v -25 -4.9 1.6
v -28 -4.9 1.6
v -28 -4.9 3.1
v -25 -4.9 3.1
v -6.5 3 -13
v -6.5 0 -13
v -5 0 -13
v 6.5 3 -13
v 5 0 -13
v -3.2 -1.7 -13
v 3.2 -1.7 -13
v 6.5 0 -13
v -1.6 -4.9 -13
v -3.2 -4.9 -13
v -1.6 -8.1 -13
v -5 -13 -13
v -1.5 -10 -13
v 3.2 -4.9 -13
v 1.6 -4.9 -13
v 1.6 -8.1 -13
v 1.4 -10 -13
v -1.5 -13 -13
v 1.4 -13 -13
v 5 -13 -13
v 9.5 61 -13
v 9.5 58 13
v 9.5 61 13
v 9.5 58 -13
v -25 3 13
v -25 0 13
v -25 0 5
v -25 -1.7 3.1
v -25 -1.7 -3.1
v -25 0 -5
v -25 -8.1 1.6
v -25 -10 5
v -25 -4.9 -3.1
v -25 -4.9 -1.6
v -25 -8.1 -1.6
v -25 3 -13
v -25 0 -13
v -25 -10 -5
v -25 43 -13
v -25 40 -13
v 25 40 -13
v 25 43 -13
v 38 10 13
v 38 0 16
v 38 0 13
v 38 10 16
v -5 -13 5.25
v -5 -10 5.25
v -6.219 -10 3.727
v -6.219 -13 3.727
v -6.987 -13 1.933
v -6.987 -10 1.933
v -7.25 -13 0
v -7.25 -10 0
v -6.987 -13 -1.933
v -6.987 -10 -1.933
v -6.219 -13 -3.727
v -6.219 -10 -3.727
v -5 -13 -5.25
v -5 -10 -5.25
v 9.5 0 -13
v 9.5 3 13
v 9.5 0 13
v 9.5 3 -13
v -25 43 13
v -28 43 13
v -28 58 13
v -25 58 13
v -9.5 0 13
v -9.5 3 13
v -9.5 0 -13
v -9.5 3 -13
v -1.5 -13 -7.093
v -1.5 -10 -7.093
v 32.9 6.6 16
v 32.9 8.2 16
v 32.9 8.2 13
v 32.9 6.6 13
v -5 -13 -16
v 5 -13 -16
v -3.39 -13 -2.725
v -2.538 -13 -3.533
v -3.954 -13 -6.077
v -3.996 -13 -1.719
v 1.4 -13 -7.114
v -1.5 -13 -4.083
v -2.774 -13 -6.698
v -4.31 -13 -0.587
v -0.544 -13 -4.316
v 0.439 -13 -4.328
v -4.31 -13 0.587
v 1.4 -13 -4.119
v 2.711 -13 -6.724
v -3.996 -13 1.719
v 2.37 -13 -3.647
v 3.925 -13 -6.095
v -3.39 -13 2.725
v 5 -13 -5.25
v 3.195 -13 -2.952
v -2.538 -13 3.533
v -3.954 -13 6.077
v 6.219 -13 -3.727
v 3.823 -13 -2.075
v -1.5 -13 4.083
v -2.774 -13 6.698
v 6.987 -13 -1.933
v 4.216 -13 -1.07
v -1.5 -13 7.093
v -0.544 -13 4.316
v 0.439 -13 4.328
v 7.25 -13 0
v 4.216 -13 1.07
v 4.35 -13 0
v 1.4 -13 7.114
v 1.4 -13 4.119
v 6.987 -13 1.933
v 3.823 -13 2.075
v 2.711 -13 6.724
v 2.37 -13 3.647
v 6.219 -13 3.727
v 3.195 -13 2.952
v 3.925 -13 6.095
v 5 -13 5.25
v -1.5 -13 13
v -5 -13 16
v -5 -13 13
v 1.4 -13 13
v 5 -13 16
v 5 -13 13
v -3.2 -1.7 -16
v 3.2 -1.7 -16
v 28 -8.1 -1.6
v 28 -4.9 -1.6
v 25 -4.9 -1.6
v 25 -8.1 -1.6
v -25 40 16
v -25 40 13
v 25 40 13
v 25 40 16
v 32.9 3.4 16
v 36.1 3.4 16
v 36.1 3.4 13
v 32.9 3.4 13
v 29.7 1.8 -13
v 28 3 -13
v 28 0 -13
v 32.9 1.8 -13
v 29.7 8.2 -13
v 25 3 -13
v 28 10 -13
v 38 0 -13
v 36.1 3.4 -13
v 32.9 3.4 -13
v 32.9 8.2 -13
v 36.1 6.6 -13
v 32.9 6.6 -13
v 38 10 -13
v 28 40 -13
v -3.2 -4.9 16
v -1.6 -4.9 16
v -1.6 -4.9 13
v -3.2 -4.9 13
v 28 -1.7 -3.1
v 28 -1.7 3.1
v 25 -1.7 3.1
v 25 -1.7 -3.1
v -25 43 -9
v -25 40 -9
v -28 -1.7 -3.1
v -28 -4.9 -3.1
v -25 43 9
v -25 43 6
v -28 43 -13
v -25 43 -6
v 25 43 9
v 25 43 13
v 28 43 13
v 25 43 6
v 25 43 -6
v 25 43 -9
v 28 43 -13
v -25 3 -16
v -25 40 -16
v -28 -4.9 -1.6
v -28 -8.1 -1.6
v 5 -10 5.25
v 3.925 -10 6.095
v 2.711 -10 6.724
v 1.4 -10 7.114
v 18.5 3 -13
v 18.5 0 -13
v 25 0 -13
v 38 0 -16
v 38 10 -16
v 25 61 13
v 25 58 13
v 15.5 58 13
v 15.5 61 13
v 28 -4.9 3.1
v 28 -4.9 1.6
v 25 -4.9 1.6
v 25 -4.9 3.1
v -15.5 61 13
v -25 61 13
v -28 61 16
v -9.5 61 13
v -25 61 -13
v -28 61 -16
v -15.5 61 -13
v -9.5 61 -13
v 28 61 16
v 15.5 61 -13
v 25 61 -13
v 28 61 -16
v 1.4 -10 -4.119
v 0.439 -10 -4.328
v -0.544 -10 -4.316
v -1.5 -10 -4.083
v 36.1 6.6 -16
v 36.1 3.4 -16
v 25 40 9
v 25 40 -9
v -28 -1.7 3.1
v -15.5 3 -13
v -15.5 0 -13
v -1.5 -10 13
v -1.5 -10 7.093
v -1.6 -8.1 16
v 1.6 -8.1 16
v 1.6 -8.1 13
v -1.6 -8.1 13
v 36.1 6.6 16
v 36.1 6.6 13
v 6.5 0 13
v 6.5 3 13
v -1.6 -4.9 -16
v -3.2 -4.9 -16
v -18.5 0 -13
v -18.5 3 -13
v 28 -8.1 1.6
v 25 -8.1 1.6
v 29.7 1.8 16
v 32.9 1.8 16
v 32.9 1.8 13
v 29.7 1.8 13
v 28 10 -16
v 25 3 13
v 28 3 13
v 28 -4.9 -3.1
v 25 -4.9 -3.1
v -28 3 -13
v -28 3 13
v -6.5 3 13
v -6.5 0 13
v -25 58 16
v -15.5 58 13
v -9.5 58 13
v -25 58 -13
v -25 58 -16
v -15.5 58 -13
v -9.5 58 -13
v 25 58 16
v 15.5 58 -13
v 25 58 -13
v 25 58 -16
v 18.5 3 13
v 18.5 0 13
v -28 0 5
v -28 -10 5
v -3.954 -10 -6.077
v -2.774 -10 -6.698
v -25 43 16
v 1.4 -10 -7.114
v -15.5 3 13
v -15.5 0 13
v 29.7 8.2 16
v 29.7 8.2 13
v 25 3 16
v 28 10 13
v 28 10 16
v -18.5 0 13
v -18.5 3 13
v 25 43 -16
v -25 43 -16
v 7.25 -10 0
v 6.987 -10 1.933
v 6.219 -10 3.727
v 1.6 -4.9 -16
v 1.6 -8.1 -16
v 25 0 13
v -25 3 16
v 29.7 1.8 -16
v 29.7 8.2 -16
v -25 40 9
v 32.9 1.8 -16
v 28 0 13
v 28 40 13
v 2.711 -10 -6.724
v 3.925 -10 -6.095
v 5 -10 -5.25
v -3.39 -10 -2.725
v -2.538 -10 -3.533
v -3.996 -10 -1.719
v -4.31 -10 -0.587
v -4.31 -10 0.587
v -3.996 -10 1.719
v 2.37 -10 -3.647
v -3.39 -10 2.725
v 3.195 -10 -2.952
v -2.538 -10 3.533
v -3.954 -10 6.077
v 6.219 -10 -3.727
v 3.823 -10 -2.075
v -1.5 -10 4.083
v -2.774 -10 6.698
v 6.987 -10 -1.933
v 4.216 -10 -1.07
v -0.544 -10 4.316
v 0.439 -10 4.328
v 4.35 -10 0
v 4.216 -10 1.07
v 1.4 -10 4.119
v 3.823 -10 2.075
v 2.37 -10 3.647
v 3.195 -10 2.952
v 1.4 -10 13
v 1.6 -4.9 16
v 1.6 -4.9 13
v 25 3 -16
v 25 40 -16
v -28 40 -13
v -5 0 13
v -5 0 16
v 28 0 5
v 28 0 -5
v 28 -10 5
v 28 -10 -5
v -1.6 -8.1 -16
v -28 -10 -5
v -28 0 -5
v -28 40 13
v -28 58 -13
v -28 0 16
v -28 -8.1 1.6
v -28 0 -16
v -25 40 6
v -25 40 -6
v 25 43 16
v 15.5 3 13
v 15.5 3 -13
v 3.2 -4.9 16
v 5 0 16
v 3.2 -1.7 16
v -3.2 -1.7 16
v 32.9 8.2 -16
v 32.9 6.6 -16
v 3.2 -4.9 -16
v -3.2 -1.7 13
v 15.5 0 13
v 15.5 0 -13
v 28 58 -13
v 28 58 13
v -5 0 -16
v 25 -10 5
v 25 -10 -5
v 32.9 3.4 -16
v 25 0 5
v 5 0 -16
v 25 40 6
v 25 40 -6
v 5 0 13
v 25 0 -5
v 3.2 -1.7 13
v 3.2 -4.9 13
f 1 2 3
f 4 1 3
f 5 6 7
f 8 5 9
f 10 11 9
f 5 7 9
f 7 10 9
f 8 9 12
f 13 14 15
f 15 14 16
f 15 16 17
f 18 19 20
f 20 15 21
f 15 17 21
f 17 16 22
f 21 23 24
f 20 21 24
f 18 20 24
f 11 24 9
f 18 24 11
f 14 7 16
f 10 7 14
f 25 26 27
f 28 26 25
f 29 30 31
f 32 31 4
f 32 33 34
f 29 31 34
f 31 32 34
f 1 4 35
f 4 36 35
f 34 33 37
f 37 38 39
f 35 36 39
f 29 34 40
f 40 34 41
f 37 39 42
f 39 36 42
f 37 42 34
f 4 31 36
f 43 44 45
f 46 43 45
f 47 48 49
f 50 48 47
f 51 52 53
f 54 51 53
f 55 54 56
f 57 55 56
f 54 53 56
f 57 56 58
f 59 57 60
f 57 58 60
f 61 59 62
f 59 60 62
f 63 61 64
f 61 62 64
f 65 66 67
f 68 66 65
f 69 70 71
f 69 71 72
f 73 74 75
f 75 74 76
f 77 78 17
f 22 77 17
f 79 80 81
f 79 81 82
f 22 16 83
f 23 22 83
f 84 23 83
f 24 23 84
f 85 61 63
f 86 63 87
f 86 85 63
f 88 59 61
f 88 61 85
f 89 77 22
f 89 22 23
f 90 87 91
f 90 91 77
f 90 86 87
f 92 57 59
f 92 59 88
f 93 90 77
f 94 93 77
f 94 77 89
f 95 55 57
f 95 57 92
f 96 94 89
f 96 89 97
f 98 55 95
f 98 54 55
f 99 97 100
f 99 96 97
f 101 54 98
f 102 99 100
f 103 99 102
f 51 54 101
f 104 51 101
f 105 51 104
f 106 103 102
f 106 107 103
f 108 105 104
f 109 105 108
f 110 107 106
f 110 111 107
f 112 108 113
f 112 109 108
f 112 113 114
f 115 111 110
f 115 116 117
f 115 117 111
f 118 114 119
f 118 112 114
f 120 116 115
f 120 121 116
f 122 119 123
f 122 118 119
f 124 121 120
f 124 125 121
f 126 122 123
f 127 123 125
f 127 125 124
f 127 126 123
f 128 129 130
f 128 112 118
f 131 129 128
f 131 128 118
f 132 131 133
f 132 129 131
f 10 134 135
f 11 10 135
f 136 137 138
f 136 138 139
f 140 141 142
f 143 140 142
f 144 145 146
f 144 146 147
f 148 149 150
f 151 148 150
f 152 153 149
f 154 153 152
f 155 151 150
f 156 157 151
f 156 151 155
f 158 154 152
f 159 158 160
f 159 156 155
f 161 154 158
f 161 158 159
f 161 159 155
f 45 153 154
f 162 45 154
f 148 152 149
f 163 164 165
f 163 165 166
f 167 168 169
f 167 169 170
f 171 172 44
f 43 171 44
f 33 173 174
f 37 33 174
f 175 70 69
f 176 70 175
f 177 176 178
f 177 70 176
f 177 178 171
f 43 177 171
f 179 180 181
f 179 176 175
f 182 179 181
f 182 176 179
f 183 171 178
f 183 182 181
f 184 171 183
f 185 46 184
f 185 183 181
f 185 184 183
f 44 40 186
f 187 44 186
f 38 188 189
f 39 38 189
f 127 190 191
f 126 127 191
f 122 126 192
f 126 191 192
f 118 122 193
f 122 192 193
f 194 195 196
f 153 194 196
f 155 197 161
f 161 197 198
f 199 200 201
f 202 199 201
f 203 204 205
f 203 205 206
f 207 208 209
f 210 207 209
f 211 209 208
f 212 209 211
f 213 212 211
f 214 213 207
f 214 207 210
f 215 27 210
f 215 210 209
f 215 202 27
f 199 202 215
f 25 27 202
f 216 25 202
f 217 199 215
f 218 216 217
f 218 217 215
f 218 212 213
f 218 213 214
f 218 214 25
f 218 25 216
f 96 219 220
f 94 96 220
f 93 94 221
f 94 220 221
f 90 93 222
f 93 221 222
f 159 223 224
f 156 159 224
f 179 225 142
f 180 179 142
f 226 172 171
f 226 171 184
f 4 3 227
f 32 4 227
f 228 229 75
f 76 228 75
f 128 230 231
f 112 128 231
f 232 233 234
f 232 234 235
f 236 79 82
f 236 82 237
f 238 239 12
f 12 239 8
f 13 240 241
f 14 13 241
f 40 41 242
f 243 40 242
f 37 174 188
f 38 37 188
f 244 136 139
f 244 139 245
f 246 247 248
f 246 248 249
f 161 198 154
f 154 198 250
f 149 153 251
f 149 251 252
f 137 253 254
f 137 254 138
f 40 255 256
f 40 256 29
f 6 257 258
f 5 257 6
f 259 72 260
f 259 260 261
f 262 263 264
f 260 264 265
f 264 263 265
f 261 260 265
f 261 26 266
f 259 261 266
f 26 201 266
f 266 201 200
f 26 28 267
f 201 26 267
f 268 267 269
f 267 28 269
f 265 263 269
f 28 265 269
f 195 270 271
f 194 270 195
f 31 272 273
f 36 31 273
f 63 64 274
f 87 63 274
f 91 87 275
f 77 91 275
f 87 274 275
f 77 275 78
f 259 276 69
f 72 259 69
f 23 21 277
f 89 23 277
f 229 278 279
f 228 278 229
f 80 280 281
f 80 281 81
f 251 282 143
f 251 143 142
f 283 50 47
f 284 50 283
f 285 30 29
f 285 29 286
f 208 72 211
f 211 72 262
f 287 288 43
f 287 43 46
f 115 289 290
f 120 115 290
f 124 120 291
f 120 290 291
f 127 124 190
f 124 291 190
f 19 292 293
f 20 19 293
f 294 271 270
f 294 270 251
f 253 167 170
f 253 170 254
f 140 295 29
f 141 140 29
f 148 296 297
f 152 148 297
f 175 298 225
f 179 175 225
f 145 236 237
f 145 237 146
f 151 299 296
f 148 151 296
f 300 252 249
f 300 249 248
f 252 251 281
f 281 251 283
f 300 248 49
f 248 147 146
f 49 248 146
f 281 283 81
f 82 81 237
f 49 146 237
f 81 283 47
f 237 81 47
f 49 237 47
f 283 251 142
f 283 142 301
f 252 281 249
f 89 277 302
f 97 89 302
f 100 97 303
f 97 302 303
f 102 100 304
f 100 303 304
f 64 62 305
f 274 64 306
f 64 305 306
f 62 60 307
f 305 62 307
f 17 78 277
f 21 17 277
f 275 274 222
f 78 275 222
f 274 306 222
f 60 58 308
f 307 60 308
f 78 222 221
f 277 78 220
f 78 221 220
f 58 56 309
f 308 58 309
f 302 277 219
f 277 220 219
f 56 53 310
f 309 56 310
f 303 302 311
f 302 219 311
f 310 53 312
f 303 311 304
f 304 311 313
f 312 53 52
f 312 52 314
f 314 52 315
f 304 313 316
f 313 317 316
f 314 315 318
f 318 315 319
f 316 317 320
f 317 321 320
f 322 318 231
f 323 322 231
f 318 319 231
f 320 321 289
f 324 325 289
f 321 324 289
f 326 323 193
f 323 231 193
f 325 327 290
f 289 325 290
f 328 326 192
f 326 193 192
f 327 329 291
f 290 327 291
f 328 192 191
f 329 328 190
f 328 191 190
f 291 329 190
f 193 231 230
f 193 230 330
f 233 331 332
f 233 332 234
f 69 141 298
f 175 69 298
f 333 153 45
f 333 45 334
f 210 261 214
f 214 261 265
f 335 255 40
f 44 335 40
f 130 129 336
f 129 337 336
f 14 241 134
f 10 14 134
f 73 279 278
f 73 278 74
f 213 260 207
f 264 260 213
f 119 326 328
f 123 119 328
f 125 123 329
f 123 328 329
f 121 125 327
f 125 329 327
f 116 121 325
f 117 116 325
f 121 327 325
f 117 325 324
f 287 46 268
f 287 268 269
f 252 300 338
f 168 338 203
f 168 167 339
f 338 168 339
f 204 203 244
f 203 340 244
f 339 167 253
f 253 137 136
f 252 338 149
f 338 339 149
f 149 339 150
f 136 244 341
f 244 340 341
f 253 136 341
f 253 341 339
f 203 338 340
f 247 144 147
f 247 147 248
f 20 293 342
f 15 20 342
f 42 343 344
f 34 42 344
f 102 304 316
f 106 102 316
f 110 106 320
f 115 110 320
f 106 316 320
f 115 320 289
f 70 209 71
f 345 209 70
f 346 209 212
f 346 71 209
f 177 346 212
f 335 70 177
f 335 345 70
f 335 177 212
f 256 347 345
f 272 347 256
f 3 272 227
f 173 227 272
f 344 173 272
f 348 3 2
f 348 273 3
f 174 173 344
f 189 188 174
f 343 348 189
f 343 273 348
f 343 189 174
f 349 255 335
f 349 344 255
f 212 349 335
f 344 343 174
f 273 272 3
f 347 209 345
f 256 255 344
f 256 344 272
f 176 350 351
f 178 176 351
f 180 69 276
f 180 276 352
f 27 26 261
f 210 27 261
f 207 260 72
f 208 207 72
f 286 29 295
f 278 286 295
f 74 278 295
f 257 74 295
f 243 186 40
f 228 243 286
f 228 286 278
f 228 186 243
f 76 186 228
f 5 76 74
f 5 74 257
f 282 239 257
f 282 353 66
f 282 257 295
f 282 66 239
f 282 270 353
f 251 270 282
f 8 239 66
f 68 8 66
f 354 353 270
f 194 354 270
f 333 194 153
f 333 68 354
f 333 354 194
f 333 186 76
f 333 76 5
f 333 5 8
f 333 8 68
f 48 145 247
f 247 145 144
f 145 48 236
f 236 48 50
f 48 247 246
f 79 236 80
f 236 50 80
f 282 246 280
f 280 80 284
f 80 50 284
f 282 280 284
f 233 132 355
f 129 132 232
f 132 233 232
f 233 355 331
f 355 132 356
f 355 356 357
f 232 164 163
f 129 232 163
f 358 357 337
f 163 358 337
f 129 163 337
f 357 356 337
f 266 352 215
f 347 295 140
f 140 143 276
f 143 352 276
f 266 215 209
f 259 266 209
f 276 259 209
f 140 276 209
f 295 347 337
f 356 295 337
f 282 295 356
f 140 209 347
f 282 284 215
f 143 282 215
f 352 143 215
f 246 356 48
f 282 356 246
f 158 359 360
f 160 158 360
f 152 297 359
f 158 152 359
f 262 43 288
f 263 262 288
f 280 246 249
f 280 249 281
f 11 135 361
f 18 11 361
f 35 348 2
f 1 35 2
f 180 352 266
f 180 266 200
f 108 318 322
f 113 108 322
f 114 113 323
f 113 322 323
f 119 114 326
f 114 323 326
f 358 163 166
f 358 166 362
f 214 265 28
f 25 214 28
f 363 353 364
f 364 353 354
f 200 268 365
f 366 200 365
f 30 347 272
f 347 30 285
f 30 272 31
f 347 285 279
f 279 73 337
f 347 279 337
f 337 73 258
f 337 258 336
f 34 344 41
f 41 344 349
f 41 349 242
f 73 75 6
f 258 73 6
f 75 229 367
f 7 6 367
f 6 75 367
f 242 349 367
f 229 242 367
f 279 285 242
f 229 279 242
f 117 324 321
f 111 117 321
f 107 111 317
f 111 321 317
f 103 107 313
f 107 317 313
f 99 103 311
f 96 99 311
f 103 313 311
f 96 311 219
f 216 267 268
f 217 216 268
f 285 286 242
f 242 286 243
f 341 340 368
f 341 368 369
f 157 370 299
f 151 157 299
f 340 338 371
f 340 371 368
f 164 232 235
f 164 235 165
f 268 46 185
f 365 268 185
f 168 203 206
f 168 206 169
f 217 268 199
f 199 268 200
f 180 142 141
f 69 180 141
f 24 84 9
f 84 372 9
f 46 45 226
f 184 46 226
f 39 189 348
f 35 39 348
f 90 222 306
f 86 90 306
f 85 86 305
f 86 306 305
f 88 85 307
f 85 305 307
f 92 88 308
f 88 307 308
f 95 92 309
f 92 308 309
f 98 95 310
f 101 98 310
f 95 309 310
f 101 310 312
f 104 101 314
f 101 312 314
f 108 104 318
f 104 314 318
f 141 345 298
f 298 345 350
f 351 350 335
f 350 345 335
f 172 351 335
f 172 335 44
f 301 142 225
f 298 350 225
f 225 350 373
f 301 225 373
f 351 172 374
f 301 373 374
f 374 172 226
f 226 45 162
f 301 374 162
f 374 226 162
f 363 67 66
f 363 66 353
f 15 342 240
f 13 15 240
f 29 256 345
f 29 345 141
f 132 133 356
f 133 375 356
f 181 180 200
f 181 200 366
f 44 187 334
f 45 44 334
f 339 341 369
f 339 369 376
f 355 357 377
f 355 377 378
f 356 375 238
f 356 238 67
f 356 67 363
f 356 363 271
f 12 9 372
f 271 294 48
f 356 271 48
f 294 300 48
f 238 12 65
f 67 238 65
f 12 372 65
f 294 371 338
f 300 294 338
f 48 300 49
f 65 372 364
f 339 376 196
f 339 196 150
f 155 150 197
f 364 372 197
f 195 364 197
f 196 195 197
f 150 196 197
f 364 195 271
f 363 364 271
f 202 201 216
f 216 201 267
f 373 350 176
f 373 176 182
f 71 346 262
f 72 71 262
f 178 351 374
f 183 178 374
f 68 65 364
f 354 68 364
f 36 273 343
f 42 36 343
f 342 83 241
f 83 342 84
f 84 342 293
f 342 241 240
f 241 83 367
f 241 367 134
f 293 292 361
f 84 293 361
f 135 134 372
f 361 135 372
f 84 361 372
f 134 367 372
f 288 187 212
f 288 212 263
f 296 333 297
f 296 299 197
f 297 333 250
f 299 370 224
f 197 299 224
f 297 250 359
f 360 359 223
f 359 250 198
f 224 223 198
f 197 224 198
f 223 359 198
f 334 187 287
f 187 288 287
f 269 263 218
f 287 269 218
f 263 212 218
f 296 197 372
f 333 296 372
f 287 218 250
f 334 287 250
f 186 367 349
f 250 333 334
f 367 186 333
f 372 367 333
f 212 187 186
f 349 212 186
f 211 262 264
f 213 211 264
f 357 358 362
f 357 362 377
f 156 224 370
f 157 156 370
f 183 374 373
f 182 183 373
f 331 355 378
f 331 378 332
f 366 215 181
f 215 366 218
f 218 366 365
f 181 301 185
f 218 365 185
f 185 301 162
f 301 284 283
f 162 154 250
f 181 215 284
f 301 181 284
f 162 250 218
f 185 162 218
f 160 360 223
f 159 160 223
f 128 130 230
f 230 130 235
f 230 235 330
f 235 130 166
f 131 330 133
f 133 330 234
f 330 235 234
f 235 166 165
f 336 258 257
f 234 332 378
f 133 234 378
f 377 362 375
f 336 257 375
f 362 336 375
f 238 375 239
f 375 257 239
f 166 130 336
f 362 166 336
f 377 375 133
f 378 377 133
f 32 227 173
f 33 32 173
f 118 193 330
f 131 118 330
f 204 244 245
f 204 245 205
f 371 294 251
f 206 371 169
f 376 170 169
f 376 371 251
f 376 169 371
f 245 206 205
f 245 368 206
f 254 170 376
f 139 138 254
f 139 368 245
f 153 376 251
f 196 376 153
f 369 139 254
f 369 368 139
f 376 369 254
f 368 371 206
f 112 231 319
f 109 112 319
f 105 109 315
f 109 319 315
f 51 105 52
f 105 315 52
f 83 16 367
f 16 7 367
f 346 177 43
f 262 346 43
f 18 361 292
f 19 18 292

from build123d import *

# Parameters (mm, degrees)
SKETCH1_W            = 56
SKETCH1_H            = 32
SKETCH1_W_2          = 50
SKETCH1_H_2          = 26
BOSS_EXTRUDE1_DEPTH  = 3
SKETCH2_W            = 3
SKETCH2_H            = 3
BOSS_EXTRUDE2_DEPTH  = 40
BOSS_EXTRUDE3_DEPTH  = 3
BOSS_EXTRUDE4_DEPTH  = 3
SKETCH5_W            = 3
SKETCH5_H            = 26
BOSS_EXTRUDE5_DEPTH  = 3
SKETCH6_W            = 50
SKETCH6_H            = 3
SKETCH6_W_2          = 3
BOSS_EXTRUDE7_DEPTH  = 3
SKETCH7_W            = 3
SKETCH7_H            = 3
BOSS_EXTRUDE8_DEPTH  = 15
SKETCH8_W            = 3
SKETCH8_H            = 26
SKETCH8_W_2          = 6
SKETCH8_H_2          = 3
BOSS_EXTRUDE9_DEPTH  = 3
BOSS_EXTRUDE10_DEPTH = 3
BOSS_EXTRUDE11_DEPTH = 3


with BuildPart() as part:
    # Sketch1 → Boss-Extrude1 (new body)
    with BuildSketch(Plane(origin=(0, 0, 0), x_dir=(1, 0, 0), z_dir=(0, 1, 0))):
        Rectangle(SKETCH1_W, SKETCH1_H)
        Rectangle(SKETCH1_W_2, SKETCH1_H_2, mode=Mode.SUBTRACT)
    extrude(amount=BOSS_EXTRUDE1_DEPTH)

    # Sketch2 → Boss-Extrude2 (add)
    with BuildSketch(Plane(origin=(0, 0, 0), x_dir=(1, 0, 0), z_dir=(0, 1, 0))):
        with Locations((26.5, 14.5)):
            Rectangle(SKETCH2_W, SKETCH2_H)
        with Locations((26.5, -14.5)):
            Rectangle(SKETCH2_W, SKETCH2_H)
        with Locations((-26.5, -14.5)):
            Rectangle(SKETCH2_W, SKETCH2_H)
        with Locations((-26.5, 14.5)):
            Rectangle(SKETCH2_W, SKETCH2_H)
    extrude(amount=BOSS_EXTRUDE2_DEPTH)

    # Sketch3 → Boss-Extrude3 (add)
    with BuildSketch(Plane.XY.offset(16)):
        Polygon((28, 10), (28, 5), (29.7, 5), (29.7, 8.2), (32.9, 8.2), (32.9, 6.6), (36.1, 6.6), (36.1, 5), (38, 5), (38, 10), align=None)
        Polygon((28, 5), (28, 0), (38, 0), (38, 5), (36.1, 5), (36.1, 3.4), (32.9, 3.4), (32.9, 1.8), (29.7, 1.8), (29.7, 5), align=None)
    boss_extrude3 = extrude(amount=-BOSS_EXTRUDE3_DEPTH)

    # Mirror1: Boss-Extrude3 across plane
    add(boss_extrude3.mirror(Plane.XY))

    # Sketch4 → Boss-Extrude4 (add)
    with BuildSketch(Plane.XY.offset(16)):
        Polygon((5, 0), (0, 0), (-5, 0), (-5, -10), (0, -10), (5, -10), align=None)
        Polygon((1.6, -8.1), (0, -8.1), (-1.6, -8.1), (-1.6, -4.9), (-3.2, -4.9), (-3.2, -1.7), (3.2, -1.7), (3.2, -4.9), (1.6, -4.9), align=None, mode=Mode.SUBTRACT)
    boss_extrude4 = extrude(amount=-BOSS_EXTRUDE4_DEPTH)

    # Mirror2: Boss-Extrude4 across plane
    add(boss_extrude4.mirror(Plane.XY))

    # Sketch5 → Boss-Extrude5 (add)
    with BuildSketch(Plane(origin=(0, 3, 0), x_dir=(1, 0, 0), z_dir=(0, 1, 0))):
        with Locations((-17, 0)):
            Rectangle(SKETCH5_W, SKETCH5_H)
        with Locations((-8, 0)):
            Rectangle(SKETCH5_W, SKETCH5_H)
        with Locations((8, 0)):
            Rectangle(SKETCH5_W, SKETCH5_H)
        with Locations((17, 0)):
            Rectangle(SKETCH5_W, SKETCH5_H)
    extrude(amount=-BOSS_EXTRUDE5_DEPTH)

    # Sketch6 → Boss-Extrude7 (add)
    # profile 1 of 4: a face of its own
    with BuildSketch(Plane(origin=(0, 40, 0), x_dir=(1, 0, 0), z_dir=(0, 1, 0))):
        Polygon((-28, -16), (25, -16), (25, -13), (28, -13), (28, 16), (-28, 16), align=None)
        Polygon((25, -9), (25, -13), (-25, -13), (-25, -9), (-25, -6), (-25, 6), (-25, 9), (-25, 13), (25, 13), (25, 9), (25, 6), (25, -6), align=None, mode=Mode.SUBTRACT)
    # profile 2 of 4: a face of its own
    with BuildSketch(Plane(origin=(0, 40, 0), x_dir=(1, 0, 0), z_dir=(0, 1, 0))):
        with Locations((0, -7.5)):
            Rectangle(SKETCH6_W, SKETCH6_H)
    # profile 3 of 4: a face of its own
    with BuildSketch(Plane(origin=(0, 40, 0), x_dir=(1, 0, 0), z_dir=(0, 1, 0))):
        with Locations((0, 7.5)):
            Rectangle(SKETCH6_W, SKETCH6_H)
    # profile 4 of 4: a face of its own
    with BuildSketch(Plane(origin=(0, 40, 0), x_dir=(1, 0, 0), z_dir=(0, 1, 0))):
        with Locations((26.5, -14.5)):
            Rectangle(SKETCH6_W_2, SKETCH6_H)
    extrude(amount=BOSS_EXTRUDE7_DEPTH)

    # Sketch7 → Boss-Extrude8 (add)
    with BuildSketch(Plane(origin=(0, 43, 0), x_dir=(1, 0, 0), z_dir=(0, 1, 0))):
        with Locations((-26.5, -14.5)):
            Rectangle(SKETCH7_W, SKETCH7_H)
        with Locations((-26.5, 14.5)):
            Rectangle(SKETCH7_W, SKETCH7_H)
        with Locations((26.5, 14.5)):
            Rectangle(SKETCH7_W, SKETCH7_H)
        with Locations((26.5, -14.5)):
            Rectangle(SKETCH7_W, SKETCH7_H)
    extrude(amount=BOSS_EXTRUDE8_DEPTH)

    # Sketch8 → Boss-Extrude9 (add)
    # profile 1 of 5: a face of its own
    with BuildSketch(Plane(origin=(0, 58, 0), x_dir=(1, 0, 0), z_dir=(0, 1, 0))):
        Polygon((-25, 16), (-25, 13), (-28, 13), (-28, -16), (28, -16), (28, 16), align=None)
        Polygon((25, 13), (25, -13), (15.5, -13), (12.5, -13), (9.5, -13), (0, -13), (-9.5, -13), (-15.5, -13), (-25, -13), (-25, 13), (-15.5, 13), (-9.5, 13), (9.5, 13), (12.5, 13), (15.5, 13), align=None, mode=Mode.SUBTRACT)
    # profile 2 of 5: a face of its own
    with BuildSketch(Plane(origin=(0, 58, 0), x_dir=(1, 0, 0), z_dir=(0, 1, 0))):
        with Locations((11, 0)):
            Rectangle(SKETCH8_W, SKETCH8_H)
    # profile 3 of 5: a face of its own
    with BuildSketch(Plane(origin=(0, 58, 0), x_dir=(1, 0, 0), z_dir=(0, 1, 0))):
        with Locations((14, 0)):
            Rectangle(SKETCH8_W, SKETCH8_H)
    # profile 4 of 5: a face of its own
    with BuildSketch(Plane(origin=(0, 58, 0), x_dir=(1, 0, 0), z_dir=(0, 1, 0))):
        with Locations((-12.5, 0)):
            Rectangle(SKETCH8_W_2, SKETCH8_H)
    # profile 5 of 5: a face of its own
    with BuildSketch(Plane(origin=(0, 58, 0), x_dir=(1, 0, 0), z_dir=(0, 1, 0))):
        with Locations((-26.5, 14.5)):
            Rectangle(SKETCH8_W, SKETCH8_H_2)
    extrude(amount=BOSS_EXTRUDE9_DEPTH)

    # Sketch9 → Boss-Extrude10 (add)
    with BuildSketch(Plane.XZ.offset(10)):
        with BuildLine():
            ThreePointArc((-5, -5.25), (-3.378132989, -6.414882502), (-1.5, -7.09313048))
            Line((-1.5, -7.09313048), (-1.5, -4.083197277))
            ThreePointArc((-1.5, -4.083197277), (-4.35, 0), (-1.5, 4.083197277))
            Line((-1.5, 4.083197277), (-1.5, 7.09313048))
            ThreePointArc((-1.5, 7.09313048), (-3.378132989, 6.414882502), (-5, 5.25))
            Line((-5, 5.25), (-5, -5.25))
        make_face()
        with BuildLine():
            ThreePointArc((-5, 5.25), (-7.25, 0), (-5, -5.25))
            Line((-5, -5.25), (-5, 5.25))
        make_face()
        with BuildLine():
            Line((-1.5, -4.083197277), (-1.5, -7.09313048))
            ThreePointArc((-1.5, -7.09313048), (-0.051031089, -7.2498204), (1.4, -7.113543421))
            Line((1.4, -7.113543421), (1.4, -4.118555572))
            ThreePointArc((1.4, -4.118555572), (-0.053033501, -4.349676706), (-1.5, -4.083197277))
        make_face()
        with BuildLine():
            Line((-1.5, 7.09313048), (-1.5, 4.083197277))
            ThreePointArc((-1.5, 4.083197277), (-0.053033501, 4.349676706), (1.4, 4.118555572))
            Line((1.4, 4.118555572), (1.4, 7.113543421))
            ThreePointArc((1.4, 7.113543421), (-0.051031089, 7.2498204), (-1.5, 7.09313048))
        make_face()
        with BuildLine():
            Line((1.4, -4.118555572), (1.4, -7.113543421))
            ThreePointArc((1.4, -7.113543421), (3.332896416, -6.438501493), (5, -5.25))
            Line((5, -5.25), (5, 5.25))
            ThreePointArc((5, 5.25), (3.332896416, 6.438501493), (1.4, 7.113543421))
            Line((1.4, 7.113543421), (1.4, 4.118555572))
            ThreePointArc((1.4, 4.118555572), (3.536417679, 2.53303178), (4.35, 0))
            ThreePointArc((4.35, 0), (3.536417679, -2.53303178), (1.4, -4.118555572))
        make_face()
        with BuildLine():
            Line((5, 5.25), (5, -5.25))
            ThreePointArc((5, -5.25), (6.663801468, -2.855914915), (7.25, 0))
            ThreePointArc((7.25, 0), (6.663801468, 2.855914915), (5, 5.25))
        make_face()
        with BuildLine():
            Line((-1.5, 13), (-1.5, 7.09313048))
            ThreePointArc((-1.5, 7.09313048), (-0.051031089, 7.2498204), (1.4, 7.113543421))
            Line((1.4, 7.113543421), (1.4, 13))
            Line((1.4, 13), (-1.5, 13))
        make_face()
        Polygon((-5, 16), (-5, 13), (-1.5, 13), (1.4, 13), (5, 13), (5, 16), align=None)
        with BuildLine():
            Line((-1.5, -13), (0, -13))
            Line((0, -13), (1.4, -13))
            Line((1.4, -13), (1.4, -7.113543421))
            ThreePointArc((1.4, -7.113543421), (-0.051031089, -7.2498204), (-1.5, -7.09313048))
            Line((-1.5, -7.09313048), (-1.5, -13))
        make_face()
        Polygon((1.4, -13), (0, -13), (-1.5, -13), (-5, -13), (-5, -16), (5, -16), (5, -13), align=None)
    extrude(amount=BOSS_EXTRUDE10_DEPTH)

    # Sketch10 → Boss-Extrude11 (add)
    with BuildSketch(Plane(origin=(28, 0, 0), x_dir=(0, 0, -1), z_dir=(1, 0, 0))):
        Polygon((5, 0), (0, 0), (-5, 0), (-5, -10), (0, -10), (5, -10), align=None)
        Polygon((1.6, -8.1), (0, -8.1), (-1.6, -8.1), (-1.6, -4.9), (-3.1, -4.9), (-3.1, -1.7), (3.1, -1.7), (3.1, -4.9), (1.6, -4.9), align=None, mode=Mode.SUBTRACT)
    boss_extrude11 = extrude(amount=-BOSS_EXTRUDE11_DEPTH)

    # Mirror3: Boss-Extrude11 across plane
    add(boss_extrude11.mirror(Plane(origin=(0, 0, 0), x_dir=(0, 0, 1), z_dir=(1, 0, 0))))


solid = part.part
